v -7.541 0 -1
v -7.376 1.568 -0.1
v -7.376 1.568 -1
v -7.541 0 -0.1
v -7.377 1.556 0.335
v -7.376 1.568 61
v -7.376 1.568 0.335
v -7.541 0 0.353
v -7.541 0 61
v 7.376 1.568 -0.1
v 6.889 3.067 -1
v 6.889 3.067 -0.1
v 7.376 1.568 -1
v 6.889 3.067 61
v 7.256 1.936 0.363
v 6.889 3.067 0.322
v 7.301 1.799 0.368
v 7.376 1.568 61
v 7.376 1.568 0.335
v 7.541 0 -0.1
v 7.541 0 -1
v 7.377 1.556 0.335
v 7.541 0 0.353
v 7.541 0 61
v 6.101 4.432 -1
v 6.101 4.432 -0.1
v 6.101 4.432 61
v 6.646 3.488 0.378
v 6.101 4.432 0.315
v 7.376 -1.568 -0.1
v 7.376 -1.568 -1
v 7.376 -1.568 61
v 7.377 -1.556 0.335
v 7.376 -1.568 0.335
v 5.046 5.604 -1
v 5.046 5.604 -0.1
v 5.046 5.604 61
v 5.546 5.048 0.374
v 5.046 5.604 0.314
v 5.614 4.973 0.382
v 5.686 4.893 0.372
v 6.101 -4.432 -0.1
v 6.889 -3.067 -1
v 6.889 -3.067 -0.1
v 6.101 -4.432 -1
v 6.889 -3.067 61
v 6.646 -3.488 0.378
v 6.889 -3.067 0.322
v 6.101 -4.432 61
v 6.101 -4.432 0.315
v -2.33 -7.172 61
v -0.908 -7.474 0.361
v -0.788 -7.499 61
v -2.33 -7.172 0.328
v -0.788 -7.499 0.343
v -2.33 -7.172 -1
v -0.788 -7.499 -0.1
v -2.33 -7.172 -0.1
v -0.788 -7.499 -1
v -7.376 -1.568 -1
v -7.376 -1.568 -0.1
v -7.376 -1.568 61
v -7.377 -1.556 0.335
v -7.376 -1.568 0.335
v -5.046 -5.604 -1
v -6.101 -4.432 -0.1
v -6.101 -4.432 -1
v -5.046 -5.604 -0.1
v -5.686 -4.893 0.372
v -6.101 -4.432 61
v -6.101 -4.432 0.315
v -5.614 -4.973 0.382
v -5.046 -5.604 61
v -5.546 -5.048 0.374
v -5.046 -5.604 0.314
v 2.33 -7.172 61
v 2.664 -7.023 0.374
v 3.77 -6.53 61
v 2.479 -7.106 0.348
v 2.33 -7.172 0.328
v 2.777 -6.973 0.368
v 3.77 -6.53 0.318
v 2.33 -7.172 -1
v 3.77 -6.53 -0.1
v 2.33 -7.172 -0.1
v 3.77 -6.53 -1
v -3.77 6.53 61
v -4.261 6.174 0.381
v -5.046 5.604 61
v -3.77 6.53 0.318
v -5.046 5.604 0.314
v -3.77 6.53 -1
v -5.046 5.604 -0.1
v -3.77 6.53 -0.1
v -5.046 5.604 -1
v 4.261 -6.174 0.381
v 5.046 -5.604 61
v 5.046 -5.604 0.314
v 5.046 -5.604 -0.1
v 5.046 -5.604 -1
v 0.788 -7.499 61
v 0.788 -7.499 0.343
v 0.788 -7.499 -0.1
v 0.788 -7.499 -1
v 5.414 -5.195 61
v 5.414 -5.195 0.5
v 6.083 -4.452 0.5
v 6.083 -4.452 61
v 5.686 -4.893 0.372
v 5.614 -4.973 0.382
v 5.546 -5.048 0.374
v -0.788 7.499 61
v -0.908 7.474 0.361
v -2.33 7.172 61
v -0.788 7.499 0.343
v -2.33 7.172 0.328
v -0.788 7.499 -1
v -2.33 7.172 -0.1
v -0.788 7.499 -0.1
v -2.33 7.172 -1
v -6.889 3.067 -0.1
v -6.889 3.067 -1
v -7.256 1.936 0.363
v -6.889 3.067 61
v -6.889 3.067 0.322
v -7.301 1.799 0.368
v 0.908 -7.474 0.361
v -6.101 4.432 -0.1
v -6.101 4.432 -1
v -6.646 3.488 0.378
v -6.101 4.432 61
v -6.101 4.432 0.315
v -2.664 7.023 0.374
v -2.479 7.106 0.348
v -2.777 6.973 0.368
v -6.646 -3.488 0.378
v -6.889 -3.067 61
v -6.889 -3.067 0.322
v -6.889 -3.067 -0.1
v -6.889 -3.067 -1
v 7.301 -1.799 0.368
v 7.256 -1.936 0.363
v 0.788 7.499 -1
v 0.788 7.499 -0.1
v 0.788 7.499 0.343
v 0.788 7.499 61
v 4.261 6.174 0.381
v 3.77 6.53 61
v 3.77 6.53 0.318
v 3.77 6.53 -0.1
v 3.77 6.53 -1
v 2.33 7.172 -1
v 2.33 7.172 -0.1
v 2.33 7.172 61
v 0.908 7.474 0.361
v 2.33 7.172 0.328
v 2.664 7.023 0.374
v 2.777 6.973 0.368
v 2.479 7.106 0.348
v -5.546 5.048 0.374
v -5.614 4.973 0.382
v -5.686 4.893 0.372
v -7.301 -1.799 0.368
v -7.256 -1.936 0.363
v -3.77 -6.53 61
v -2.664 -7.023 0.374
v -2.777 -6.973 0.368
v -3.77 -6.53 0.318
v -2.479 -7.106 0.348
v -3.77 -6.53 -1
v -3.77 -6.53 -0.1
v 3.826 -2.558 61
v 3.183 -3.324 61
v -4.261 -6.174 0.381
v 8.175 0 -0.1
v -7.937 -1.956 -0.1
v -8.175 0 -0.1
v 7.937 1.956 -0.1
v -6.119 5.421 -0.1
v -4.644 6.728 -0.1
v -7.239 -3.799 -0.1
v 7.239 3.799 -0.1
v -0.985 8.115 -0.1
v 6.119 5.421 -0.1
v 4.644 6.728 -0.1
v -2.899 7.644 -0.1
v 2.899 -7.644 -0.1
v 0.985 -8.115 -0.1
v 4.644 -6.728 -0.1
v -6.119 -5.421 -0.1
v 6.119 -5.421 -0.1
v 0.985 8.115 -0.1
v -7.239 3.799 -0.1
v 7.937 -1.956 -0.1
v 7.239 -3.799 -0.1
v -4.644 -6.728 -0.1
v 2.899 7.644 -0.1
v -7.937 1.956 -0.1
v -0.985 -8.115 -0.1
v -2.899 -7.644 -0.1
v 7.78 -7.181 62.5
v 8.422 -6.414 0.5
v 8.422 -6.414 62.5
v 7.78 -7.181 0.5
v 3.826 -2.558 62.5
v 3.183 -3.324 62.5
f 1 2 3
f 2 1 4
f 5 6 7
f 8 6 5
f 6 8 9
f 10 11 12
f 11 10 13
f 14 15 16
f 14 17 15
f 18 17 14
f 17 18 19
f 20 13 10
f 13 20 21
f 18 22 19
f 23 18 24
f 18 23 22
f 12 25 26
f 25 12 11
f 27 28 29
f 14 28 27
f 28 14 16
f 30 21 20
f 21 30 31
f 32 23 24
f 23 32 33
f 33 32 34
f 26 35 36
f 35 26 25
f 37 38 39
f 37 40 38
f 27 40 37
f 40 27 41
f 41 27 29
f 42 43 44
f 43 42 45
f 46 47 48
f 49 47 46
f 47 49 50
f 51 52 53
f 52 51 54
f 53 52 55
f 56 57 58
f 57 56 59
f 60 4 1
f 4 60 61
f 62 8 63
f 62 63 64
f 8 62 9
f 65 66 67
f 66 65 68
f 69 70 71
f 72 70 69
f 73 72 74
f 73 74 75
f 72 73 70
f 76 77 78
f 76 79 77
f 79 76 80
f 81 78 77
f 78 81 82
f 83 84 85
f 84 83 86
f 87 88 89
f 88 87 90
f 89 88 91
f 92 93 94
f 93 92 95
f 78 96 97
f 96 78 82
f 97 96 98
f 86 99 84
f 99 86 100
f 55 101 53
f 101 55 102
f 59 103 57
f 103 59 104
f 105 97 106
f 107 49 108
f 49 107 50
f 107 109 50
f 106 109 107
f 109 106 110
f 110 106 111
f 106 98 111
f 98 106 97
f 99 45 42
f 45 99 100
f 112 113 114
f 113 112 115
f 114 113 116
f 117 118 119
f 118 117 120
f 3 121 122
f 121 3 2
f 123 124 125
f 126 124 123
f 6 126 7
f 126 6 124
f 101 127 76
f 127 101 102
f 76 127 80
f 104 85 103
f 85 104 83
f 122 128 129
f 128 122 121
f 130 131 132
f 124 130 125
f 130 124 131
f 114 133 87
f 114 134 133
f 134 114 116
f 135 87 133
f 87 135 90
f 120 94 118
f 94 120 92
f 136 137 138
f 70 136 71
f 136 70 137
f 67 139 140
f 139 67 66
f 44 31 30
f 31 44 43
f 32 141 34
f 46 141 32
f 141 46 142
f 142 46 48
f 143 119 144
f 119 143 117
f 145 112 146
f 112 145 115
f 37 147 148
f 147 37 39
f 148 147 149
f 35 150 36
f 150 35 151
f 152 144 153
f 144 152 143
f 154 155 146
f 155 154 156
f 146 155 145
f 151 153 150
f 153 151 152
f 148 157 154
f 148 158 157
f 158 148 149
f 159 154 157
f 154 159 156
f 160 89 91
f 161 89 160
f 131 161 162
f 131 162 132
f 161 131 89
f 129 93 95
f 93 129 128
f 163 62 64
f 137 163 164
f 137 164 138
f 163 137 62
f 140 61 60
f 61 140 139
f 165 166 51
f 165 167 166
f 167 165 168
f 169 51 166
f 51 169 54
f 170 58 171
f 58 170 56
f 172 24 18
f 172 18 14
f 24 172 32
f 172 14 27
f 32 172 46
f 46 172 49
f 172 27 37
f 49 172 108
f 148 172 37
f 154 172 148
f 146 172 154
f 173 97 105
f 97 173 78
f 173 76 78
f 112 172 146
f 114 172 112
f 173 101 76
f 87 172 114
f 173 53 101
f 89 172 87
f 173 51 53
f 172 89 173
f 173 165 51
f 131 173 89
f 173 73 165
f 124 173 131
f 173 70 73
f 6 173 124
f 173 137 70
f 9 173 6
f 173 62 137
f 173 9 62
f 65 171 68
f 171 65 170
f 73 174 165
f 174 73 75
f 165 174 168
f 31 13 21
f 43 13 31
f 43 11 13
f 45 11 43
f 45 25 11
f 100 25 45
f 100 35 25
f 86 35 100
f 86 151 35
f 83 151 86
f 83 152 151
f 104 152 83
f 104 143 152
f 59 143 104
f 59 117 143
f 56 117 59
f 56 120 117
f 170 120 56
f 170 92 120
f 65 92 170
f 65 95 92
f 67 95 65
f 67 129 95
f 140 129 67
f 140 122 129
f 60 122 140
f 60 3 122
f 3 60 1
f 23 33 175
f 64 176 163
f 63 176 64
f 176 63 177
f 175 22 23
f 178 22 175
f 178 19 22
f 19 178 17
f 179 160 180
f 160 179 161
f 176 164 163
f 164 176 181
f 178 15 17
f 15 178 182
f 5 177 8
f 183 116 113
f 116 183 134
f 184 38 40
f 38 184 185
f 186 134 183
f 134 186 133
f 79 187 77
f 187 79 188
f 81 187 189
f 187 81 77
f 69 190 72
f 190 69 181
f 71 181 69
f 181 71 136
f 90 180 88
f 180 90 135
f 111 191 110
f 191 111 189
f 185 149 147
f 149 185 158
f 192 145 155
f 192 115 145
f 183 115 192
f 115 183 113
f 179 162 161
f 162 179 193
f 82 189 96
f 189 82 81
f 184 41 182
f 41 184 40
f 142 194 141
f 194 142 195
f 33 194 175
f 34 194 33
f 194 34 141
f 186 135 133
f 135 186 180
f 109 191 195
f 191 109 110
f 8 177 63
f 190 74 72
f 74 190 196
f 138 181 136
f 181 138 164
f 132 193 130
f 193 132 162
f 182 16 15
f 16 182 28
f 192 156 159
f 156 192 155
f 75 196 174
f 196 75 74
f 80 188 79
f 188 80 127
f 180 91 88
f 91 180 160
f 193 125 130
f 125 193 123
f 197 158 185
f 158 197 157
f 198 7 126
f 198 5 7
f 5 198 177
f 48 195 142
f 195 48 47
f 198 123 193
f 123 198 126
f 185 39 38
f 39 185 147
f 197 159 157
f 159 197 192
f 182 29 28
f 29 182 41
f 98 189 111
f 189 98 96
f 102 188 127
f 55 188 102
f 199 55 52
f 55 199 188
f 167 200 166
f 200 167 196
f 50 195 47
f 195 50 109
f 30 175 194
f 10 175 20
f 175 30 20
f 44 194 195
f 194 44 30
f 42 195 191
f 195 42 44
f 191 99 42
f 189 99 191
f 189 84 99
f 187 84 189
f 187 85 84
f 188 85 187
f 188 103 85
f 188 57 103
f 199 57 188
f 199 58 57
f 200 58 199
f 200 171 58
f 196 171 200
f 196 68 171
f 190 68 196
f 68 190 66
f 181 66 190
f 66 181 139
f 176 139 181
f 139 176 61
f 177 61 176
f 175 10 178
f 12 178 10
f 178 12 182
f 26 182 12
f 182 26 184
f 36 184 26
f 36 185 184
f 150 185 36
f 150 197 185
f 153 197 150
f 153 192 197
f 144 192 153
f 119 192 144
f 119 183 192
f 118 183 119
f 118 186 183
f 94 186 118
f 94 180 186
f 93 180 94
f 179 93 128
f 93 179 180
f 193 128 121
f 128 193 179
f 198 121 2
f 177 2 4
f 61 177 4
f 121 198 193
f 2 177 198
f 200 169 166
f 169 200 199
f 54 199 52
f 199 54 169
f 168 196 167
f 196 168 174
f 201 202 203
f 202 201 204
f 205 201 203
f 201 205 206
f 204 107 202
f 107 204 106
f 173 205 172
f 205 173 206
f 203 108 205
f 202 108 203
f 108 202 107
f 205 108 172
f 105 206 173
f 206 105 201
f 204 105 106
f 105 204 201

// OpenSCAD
// file: polyholes.scad
//
// Mendel90
//
// GNU GPL v2
// nop.head@gmail.com
// hydraraptor.blogspot.com
//
// See http://hydraraptor.blogspot.com/2011/02/polyholes.html
//
function sides(r) = max(round(4 *r),3);
function correctedRadius(r,n) = 0.1 + r / cos(180 / n);
function correctedDiameter(d) = 0.2 + d / cos(180 / sides(d / 2));

module polyCircle(r, center = false) {
    n = sides(r);
    circle(r = correctedRadius(r,n), $fn = n, center = center);
}

module poly_circle(r, center = false) {
        polyCircle(r, center);
}

module polyCylinder(r, h, center = false) {
    n = sides(r);
    cylinder(h = h, r = correctedRadius(r,n), $fn = n, center = center);
}

module poly_cylinder(r, h, center = false) {
        polyCylinder(r,h,center);
}

module polydCylinder(r, center = false) {
    n = sides(r);
    r = correctedRadius(r,n);
    cylinder(h = h, r = r, $fn = n, center = center);
    translate([0, -r, 0])
        cube([r, 2 * r, h]);
}

module poly_d_cylinder(r, center = false) {
        polydCylinder(r,center);
}
// main file
// PRUSA iteration3
// Bearing holders
// GNU GPL v3
// Josef Průša <iam@josefprusa.cz> and contributors
// http://www.reprap.org/wiki/Prusa_Mendel
// http://prusamendel.org

use <polyholes.scad>

bearing_diameter = 14.95;

module horizontal_bearing_base(bearings=1){
 translate(v=[0,0,6]) cube(size = [24,8+bearings*25,12], center = true);        
}

module horizontal_bearing_holes(bearings=1){
 cutter_lenght = 10+bearings*25;
 one_holder_lenght = 8+25;
 holder_lenght = 8+bearings*25;
 
 // Main bearing cut
 difference(){
  translate(v=[0,0,12]) rotate(a=[90,0,0]) translate(v=[0,0,-cutter_lenght/2]) cylinder(h = cutter_lenght, r=(bearing_diameter/2)+0.2, $fn=50);
  // Bearing retainers
  translate(v=[0,1-holder_lenght/2,3]) cube(size = [24,6,8], center = true);
  translate(v=[0,-1+holder_lenght/2,3]) cube(size = [24,6,8], center = true);
 }
 
 // Ziptie cutouts
 ziptie_cut_ofset = 0;
 for ( i = [0 : bearings-1] ){
  // For easier positioning I move them by half of one 
  // bearing holder then add each bearign lenght and then center again
  translate(v=[0,-holder_lenght/2,0]) translate(v=[0,one_holder_lenght/2+i*25,0]) difference(){
   union(){
    translate(v=[0,2-8.5,12]) rotate(a=[90,0,0]) translate(v=[0,0,0]) cylinder(h = 4, r=11.5, $fn=50);
    translate(v=[0,2+8.5,12]) rotate(a=[90,0,0]) translate(v=[0,0,0]) cylinder(h = 4, r=11.5, $fn=50);
   }
   translate(v=[0,12,12]) rotate(a=[90,0,0]) translate(v=[0,0,0]) cylinder(h = 24, r=9, $fn=50);
  }
 }
 
}
 
module horizontal_bearing_holes_nozip(bearings=1){
 cutter_lenght = 10+bearings*25;
 one_holder_lenght = 8+25;
 holder_lenght = 8+bearings*25;
 
 // Main bearing cut
 difference(){
  translate(v=[0,0,12]) rotate(a=[90,0,0]) translate(v=[0,0,-cutter_lenght/2]) cylinder(h = cutter_lenght, r=(bearing_diameter/2)+0.2, $fn=50);
  // Bearing retainers
  translate(v=[0,1-holder_lenght/2,3]) cube(size = [24,6,8], center = true);
  translate(v=[0,-1+holder_lenght/2,3]) cube(size = [24,6,8], center = true);
 }
 
}


thinwall = 3;
bearing_size = bearing_diameter + 2 * thinwall;

module vertical_bearing_base(){
 translate(v=[-2-bearing_size/4,0,29]) cube(size = [4+bearing_size/2,bearing_size,58], center = true);
 cylinder(h = 58, r=bearing_size/2, $fn = 90);
}

module vertical_bearing_holes(){
  translate(v=[0,0,-1]) poly_cylinder(h = 62, r=(14.80/2));
  translate(v=[0,0,-0.1]) cylinder(r1=(bearing_diameter/2)+0.7,r2=(bearing_diameter/2), h=0.5);
  rotate(a=[0,0,-40]) translate(v=[bearing_diameter/2-2.9,-0.5,0.5]) cube(size = [thinwall*2,1,62]);

}

//difference(){
//vertical_bearing_base();
vertical_bearing_holes();
//}
//horizontal_bearing_test();
//horizontal_bearing_base(1);
//horizontal_bearing_holes(1);
//horizontal_bearing_holes_nozip(1);
